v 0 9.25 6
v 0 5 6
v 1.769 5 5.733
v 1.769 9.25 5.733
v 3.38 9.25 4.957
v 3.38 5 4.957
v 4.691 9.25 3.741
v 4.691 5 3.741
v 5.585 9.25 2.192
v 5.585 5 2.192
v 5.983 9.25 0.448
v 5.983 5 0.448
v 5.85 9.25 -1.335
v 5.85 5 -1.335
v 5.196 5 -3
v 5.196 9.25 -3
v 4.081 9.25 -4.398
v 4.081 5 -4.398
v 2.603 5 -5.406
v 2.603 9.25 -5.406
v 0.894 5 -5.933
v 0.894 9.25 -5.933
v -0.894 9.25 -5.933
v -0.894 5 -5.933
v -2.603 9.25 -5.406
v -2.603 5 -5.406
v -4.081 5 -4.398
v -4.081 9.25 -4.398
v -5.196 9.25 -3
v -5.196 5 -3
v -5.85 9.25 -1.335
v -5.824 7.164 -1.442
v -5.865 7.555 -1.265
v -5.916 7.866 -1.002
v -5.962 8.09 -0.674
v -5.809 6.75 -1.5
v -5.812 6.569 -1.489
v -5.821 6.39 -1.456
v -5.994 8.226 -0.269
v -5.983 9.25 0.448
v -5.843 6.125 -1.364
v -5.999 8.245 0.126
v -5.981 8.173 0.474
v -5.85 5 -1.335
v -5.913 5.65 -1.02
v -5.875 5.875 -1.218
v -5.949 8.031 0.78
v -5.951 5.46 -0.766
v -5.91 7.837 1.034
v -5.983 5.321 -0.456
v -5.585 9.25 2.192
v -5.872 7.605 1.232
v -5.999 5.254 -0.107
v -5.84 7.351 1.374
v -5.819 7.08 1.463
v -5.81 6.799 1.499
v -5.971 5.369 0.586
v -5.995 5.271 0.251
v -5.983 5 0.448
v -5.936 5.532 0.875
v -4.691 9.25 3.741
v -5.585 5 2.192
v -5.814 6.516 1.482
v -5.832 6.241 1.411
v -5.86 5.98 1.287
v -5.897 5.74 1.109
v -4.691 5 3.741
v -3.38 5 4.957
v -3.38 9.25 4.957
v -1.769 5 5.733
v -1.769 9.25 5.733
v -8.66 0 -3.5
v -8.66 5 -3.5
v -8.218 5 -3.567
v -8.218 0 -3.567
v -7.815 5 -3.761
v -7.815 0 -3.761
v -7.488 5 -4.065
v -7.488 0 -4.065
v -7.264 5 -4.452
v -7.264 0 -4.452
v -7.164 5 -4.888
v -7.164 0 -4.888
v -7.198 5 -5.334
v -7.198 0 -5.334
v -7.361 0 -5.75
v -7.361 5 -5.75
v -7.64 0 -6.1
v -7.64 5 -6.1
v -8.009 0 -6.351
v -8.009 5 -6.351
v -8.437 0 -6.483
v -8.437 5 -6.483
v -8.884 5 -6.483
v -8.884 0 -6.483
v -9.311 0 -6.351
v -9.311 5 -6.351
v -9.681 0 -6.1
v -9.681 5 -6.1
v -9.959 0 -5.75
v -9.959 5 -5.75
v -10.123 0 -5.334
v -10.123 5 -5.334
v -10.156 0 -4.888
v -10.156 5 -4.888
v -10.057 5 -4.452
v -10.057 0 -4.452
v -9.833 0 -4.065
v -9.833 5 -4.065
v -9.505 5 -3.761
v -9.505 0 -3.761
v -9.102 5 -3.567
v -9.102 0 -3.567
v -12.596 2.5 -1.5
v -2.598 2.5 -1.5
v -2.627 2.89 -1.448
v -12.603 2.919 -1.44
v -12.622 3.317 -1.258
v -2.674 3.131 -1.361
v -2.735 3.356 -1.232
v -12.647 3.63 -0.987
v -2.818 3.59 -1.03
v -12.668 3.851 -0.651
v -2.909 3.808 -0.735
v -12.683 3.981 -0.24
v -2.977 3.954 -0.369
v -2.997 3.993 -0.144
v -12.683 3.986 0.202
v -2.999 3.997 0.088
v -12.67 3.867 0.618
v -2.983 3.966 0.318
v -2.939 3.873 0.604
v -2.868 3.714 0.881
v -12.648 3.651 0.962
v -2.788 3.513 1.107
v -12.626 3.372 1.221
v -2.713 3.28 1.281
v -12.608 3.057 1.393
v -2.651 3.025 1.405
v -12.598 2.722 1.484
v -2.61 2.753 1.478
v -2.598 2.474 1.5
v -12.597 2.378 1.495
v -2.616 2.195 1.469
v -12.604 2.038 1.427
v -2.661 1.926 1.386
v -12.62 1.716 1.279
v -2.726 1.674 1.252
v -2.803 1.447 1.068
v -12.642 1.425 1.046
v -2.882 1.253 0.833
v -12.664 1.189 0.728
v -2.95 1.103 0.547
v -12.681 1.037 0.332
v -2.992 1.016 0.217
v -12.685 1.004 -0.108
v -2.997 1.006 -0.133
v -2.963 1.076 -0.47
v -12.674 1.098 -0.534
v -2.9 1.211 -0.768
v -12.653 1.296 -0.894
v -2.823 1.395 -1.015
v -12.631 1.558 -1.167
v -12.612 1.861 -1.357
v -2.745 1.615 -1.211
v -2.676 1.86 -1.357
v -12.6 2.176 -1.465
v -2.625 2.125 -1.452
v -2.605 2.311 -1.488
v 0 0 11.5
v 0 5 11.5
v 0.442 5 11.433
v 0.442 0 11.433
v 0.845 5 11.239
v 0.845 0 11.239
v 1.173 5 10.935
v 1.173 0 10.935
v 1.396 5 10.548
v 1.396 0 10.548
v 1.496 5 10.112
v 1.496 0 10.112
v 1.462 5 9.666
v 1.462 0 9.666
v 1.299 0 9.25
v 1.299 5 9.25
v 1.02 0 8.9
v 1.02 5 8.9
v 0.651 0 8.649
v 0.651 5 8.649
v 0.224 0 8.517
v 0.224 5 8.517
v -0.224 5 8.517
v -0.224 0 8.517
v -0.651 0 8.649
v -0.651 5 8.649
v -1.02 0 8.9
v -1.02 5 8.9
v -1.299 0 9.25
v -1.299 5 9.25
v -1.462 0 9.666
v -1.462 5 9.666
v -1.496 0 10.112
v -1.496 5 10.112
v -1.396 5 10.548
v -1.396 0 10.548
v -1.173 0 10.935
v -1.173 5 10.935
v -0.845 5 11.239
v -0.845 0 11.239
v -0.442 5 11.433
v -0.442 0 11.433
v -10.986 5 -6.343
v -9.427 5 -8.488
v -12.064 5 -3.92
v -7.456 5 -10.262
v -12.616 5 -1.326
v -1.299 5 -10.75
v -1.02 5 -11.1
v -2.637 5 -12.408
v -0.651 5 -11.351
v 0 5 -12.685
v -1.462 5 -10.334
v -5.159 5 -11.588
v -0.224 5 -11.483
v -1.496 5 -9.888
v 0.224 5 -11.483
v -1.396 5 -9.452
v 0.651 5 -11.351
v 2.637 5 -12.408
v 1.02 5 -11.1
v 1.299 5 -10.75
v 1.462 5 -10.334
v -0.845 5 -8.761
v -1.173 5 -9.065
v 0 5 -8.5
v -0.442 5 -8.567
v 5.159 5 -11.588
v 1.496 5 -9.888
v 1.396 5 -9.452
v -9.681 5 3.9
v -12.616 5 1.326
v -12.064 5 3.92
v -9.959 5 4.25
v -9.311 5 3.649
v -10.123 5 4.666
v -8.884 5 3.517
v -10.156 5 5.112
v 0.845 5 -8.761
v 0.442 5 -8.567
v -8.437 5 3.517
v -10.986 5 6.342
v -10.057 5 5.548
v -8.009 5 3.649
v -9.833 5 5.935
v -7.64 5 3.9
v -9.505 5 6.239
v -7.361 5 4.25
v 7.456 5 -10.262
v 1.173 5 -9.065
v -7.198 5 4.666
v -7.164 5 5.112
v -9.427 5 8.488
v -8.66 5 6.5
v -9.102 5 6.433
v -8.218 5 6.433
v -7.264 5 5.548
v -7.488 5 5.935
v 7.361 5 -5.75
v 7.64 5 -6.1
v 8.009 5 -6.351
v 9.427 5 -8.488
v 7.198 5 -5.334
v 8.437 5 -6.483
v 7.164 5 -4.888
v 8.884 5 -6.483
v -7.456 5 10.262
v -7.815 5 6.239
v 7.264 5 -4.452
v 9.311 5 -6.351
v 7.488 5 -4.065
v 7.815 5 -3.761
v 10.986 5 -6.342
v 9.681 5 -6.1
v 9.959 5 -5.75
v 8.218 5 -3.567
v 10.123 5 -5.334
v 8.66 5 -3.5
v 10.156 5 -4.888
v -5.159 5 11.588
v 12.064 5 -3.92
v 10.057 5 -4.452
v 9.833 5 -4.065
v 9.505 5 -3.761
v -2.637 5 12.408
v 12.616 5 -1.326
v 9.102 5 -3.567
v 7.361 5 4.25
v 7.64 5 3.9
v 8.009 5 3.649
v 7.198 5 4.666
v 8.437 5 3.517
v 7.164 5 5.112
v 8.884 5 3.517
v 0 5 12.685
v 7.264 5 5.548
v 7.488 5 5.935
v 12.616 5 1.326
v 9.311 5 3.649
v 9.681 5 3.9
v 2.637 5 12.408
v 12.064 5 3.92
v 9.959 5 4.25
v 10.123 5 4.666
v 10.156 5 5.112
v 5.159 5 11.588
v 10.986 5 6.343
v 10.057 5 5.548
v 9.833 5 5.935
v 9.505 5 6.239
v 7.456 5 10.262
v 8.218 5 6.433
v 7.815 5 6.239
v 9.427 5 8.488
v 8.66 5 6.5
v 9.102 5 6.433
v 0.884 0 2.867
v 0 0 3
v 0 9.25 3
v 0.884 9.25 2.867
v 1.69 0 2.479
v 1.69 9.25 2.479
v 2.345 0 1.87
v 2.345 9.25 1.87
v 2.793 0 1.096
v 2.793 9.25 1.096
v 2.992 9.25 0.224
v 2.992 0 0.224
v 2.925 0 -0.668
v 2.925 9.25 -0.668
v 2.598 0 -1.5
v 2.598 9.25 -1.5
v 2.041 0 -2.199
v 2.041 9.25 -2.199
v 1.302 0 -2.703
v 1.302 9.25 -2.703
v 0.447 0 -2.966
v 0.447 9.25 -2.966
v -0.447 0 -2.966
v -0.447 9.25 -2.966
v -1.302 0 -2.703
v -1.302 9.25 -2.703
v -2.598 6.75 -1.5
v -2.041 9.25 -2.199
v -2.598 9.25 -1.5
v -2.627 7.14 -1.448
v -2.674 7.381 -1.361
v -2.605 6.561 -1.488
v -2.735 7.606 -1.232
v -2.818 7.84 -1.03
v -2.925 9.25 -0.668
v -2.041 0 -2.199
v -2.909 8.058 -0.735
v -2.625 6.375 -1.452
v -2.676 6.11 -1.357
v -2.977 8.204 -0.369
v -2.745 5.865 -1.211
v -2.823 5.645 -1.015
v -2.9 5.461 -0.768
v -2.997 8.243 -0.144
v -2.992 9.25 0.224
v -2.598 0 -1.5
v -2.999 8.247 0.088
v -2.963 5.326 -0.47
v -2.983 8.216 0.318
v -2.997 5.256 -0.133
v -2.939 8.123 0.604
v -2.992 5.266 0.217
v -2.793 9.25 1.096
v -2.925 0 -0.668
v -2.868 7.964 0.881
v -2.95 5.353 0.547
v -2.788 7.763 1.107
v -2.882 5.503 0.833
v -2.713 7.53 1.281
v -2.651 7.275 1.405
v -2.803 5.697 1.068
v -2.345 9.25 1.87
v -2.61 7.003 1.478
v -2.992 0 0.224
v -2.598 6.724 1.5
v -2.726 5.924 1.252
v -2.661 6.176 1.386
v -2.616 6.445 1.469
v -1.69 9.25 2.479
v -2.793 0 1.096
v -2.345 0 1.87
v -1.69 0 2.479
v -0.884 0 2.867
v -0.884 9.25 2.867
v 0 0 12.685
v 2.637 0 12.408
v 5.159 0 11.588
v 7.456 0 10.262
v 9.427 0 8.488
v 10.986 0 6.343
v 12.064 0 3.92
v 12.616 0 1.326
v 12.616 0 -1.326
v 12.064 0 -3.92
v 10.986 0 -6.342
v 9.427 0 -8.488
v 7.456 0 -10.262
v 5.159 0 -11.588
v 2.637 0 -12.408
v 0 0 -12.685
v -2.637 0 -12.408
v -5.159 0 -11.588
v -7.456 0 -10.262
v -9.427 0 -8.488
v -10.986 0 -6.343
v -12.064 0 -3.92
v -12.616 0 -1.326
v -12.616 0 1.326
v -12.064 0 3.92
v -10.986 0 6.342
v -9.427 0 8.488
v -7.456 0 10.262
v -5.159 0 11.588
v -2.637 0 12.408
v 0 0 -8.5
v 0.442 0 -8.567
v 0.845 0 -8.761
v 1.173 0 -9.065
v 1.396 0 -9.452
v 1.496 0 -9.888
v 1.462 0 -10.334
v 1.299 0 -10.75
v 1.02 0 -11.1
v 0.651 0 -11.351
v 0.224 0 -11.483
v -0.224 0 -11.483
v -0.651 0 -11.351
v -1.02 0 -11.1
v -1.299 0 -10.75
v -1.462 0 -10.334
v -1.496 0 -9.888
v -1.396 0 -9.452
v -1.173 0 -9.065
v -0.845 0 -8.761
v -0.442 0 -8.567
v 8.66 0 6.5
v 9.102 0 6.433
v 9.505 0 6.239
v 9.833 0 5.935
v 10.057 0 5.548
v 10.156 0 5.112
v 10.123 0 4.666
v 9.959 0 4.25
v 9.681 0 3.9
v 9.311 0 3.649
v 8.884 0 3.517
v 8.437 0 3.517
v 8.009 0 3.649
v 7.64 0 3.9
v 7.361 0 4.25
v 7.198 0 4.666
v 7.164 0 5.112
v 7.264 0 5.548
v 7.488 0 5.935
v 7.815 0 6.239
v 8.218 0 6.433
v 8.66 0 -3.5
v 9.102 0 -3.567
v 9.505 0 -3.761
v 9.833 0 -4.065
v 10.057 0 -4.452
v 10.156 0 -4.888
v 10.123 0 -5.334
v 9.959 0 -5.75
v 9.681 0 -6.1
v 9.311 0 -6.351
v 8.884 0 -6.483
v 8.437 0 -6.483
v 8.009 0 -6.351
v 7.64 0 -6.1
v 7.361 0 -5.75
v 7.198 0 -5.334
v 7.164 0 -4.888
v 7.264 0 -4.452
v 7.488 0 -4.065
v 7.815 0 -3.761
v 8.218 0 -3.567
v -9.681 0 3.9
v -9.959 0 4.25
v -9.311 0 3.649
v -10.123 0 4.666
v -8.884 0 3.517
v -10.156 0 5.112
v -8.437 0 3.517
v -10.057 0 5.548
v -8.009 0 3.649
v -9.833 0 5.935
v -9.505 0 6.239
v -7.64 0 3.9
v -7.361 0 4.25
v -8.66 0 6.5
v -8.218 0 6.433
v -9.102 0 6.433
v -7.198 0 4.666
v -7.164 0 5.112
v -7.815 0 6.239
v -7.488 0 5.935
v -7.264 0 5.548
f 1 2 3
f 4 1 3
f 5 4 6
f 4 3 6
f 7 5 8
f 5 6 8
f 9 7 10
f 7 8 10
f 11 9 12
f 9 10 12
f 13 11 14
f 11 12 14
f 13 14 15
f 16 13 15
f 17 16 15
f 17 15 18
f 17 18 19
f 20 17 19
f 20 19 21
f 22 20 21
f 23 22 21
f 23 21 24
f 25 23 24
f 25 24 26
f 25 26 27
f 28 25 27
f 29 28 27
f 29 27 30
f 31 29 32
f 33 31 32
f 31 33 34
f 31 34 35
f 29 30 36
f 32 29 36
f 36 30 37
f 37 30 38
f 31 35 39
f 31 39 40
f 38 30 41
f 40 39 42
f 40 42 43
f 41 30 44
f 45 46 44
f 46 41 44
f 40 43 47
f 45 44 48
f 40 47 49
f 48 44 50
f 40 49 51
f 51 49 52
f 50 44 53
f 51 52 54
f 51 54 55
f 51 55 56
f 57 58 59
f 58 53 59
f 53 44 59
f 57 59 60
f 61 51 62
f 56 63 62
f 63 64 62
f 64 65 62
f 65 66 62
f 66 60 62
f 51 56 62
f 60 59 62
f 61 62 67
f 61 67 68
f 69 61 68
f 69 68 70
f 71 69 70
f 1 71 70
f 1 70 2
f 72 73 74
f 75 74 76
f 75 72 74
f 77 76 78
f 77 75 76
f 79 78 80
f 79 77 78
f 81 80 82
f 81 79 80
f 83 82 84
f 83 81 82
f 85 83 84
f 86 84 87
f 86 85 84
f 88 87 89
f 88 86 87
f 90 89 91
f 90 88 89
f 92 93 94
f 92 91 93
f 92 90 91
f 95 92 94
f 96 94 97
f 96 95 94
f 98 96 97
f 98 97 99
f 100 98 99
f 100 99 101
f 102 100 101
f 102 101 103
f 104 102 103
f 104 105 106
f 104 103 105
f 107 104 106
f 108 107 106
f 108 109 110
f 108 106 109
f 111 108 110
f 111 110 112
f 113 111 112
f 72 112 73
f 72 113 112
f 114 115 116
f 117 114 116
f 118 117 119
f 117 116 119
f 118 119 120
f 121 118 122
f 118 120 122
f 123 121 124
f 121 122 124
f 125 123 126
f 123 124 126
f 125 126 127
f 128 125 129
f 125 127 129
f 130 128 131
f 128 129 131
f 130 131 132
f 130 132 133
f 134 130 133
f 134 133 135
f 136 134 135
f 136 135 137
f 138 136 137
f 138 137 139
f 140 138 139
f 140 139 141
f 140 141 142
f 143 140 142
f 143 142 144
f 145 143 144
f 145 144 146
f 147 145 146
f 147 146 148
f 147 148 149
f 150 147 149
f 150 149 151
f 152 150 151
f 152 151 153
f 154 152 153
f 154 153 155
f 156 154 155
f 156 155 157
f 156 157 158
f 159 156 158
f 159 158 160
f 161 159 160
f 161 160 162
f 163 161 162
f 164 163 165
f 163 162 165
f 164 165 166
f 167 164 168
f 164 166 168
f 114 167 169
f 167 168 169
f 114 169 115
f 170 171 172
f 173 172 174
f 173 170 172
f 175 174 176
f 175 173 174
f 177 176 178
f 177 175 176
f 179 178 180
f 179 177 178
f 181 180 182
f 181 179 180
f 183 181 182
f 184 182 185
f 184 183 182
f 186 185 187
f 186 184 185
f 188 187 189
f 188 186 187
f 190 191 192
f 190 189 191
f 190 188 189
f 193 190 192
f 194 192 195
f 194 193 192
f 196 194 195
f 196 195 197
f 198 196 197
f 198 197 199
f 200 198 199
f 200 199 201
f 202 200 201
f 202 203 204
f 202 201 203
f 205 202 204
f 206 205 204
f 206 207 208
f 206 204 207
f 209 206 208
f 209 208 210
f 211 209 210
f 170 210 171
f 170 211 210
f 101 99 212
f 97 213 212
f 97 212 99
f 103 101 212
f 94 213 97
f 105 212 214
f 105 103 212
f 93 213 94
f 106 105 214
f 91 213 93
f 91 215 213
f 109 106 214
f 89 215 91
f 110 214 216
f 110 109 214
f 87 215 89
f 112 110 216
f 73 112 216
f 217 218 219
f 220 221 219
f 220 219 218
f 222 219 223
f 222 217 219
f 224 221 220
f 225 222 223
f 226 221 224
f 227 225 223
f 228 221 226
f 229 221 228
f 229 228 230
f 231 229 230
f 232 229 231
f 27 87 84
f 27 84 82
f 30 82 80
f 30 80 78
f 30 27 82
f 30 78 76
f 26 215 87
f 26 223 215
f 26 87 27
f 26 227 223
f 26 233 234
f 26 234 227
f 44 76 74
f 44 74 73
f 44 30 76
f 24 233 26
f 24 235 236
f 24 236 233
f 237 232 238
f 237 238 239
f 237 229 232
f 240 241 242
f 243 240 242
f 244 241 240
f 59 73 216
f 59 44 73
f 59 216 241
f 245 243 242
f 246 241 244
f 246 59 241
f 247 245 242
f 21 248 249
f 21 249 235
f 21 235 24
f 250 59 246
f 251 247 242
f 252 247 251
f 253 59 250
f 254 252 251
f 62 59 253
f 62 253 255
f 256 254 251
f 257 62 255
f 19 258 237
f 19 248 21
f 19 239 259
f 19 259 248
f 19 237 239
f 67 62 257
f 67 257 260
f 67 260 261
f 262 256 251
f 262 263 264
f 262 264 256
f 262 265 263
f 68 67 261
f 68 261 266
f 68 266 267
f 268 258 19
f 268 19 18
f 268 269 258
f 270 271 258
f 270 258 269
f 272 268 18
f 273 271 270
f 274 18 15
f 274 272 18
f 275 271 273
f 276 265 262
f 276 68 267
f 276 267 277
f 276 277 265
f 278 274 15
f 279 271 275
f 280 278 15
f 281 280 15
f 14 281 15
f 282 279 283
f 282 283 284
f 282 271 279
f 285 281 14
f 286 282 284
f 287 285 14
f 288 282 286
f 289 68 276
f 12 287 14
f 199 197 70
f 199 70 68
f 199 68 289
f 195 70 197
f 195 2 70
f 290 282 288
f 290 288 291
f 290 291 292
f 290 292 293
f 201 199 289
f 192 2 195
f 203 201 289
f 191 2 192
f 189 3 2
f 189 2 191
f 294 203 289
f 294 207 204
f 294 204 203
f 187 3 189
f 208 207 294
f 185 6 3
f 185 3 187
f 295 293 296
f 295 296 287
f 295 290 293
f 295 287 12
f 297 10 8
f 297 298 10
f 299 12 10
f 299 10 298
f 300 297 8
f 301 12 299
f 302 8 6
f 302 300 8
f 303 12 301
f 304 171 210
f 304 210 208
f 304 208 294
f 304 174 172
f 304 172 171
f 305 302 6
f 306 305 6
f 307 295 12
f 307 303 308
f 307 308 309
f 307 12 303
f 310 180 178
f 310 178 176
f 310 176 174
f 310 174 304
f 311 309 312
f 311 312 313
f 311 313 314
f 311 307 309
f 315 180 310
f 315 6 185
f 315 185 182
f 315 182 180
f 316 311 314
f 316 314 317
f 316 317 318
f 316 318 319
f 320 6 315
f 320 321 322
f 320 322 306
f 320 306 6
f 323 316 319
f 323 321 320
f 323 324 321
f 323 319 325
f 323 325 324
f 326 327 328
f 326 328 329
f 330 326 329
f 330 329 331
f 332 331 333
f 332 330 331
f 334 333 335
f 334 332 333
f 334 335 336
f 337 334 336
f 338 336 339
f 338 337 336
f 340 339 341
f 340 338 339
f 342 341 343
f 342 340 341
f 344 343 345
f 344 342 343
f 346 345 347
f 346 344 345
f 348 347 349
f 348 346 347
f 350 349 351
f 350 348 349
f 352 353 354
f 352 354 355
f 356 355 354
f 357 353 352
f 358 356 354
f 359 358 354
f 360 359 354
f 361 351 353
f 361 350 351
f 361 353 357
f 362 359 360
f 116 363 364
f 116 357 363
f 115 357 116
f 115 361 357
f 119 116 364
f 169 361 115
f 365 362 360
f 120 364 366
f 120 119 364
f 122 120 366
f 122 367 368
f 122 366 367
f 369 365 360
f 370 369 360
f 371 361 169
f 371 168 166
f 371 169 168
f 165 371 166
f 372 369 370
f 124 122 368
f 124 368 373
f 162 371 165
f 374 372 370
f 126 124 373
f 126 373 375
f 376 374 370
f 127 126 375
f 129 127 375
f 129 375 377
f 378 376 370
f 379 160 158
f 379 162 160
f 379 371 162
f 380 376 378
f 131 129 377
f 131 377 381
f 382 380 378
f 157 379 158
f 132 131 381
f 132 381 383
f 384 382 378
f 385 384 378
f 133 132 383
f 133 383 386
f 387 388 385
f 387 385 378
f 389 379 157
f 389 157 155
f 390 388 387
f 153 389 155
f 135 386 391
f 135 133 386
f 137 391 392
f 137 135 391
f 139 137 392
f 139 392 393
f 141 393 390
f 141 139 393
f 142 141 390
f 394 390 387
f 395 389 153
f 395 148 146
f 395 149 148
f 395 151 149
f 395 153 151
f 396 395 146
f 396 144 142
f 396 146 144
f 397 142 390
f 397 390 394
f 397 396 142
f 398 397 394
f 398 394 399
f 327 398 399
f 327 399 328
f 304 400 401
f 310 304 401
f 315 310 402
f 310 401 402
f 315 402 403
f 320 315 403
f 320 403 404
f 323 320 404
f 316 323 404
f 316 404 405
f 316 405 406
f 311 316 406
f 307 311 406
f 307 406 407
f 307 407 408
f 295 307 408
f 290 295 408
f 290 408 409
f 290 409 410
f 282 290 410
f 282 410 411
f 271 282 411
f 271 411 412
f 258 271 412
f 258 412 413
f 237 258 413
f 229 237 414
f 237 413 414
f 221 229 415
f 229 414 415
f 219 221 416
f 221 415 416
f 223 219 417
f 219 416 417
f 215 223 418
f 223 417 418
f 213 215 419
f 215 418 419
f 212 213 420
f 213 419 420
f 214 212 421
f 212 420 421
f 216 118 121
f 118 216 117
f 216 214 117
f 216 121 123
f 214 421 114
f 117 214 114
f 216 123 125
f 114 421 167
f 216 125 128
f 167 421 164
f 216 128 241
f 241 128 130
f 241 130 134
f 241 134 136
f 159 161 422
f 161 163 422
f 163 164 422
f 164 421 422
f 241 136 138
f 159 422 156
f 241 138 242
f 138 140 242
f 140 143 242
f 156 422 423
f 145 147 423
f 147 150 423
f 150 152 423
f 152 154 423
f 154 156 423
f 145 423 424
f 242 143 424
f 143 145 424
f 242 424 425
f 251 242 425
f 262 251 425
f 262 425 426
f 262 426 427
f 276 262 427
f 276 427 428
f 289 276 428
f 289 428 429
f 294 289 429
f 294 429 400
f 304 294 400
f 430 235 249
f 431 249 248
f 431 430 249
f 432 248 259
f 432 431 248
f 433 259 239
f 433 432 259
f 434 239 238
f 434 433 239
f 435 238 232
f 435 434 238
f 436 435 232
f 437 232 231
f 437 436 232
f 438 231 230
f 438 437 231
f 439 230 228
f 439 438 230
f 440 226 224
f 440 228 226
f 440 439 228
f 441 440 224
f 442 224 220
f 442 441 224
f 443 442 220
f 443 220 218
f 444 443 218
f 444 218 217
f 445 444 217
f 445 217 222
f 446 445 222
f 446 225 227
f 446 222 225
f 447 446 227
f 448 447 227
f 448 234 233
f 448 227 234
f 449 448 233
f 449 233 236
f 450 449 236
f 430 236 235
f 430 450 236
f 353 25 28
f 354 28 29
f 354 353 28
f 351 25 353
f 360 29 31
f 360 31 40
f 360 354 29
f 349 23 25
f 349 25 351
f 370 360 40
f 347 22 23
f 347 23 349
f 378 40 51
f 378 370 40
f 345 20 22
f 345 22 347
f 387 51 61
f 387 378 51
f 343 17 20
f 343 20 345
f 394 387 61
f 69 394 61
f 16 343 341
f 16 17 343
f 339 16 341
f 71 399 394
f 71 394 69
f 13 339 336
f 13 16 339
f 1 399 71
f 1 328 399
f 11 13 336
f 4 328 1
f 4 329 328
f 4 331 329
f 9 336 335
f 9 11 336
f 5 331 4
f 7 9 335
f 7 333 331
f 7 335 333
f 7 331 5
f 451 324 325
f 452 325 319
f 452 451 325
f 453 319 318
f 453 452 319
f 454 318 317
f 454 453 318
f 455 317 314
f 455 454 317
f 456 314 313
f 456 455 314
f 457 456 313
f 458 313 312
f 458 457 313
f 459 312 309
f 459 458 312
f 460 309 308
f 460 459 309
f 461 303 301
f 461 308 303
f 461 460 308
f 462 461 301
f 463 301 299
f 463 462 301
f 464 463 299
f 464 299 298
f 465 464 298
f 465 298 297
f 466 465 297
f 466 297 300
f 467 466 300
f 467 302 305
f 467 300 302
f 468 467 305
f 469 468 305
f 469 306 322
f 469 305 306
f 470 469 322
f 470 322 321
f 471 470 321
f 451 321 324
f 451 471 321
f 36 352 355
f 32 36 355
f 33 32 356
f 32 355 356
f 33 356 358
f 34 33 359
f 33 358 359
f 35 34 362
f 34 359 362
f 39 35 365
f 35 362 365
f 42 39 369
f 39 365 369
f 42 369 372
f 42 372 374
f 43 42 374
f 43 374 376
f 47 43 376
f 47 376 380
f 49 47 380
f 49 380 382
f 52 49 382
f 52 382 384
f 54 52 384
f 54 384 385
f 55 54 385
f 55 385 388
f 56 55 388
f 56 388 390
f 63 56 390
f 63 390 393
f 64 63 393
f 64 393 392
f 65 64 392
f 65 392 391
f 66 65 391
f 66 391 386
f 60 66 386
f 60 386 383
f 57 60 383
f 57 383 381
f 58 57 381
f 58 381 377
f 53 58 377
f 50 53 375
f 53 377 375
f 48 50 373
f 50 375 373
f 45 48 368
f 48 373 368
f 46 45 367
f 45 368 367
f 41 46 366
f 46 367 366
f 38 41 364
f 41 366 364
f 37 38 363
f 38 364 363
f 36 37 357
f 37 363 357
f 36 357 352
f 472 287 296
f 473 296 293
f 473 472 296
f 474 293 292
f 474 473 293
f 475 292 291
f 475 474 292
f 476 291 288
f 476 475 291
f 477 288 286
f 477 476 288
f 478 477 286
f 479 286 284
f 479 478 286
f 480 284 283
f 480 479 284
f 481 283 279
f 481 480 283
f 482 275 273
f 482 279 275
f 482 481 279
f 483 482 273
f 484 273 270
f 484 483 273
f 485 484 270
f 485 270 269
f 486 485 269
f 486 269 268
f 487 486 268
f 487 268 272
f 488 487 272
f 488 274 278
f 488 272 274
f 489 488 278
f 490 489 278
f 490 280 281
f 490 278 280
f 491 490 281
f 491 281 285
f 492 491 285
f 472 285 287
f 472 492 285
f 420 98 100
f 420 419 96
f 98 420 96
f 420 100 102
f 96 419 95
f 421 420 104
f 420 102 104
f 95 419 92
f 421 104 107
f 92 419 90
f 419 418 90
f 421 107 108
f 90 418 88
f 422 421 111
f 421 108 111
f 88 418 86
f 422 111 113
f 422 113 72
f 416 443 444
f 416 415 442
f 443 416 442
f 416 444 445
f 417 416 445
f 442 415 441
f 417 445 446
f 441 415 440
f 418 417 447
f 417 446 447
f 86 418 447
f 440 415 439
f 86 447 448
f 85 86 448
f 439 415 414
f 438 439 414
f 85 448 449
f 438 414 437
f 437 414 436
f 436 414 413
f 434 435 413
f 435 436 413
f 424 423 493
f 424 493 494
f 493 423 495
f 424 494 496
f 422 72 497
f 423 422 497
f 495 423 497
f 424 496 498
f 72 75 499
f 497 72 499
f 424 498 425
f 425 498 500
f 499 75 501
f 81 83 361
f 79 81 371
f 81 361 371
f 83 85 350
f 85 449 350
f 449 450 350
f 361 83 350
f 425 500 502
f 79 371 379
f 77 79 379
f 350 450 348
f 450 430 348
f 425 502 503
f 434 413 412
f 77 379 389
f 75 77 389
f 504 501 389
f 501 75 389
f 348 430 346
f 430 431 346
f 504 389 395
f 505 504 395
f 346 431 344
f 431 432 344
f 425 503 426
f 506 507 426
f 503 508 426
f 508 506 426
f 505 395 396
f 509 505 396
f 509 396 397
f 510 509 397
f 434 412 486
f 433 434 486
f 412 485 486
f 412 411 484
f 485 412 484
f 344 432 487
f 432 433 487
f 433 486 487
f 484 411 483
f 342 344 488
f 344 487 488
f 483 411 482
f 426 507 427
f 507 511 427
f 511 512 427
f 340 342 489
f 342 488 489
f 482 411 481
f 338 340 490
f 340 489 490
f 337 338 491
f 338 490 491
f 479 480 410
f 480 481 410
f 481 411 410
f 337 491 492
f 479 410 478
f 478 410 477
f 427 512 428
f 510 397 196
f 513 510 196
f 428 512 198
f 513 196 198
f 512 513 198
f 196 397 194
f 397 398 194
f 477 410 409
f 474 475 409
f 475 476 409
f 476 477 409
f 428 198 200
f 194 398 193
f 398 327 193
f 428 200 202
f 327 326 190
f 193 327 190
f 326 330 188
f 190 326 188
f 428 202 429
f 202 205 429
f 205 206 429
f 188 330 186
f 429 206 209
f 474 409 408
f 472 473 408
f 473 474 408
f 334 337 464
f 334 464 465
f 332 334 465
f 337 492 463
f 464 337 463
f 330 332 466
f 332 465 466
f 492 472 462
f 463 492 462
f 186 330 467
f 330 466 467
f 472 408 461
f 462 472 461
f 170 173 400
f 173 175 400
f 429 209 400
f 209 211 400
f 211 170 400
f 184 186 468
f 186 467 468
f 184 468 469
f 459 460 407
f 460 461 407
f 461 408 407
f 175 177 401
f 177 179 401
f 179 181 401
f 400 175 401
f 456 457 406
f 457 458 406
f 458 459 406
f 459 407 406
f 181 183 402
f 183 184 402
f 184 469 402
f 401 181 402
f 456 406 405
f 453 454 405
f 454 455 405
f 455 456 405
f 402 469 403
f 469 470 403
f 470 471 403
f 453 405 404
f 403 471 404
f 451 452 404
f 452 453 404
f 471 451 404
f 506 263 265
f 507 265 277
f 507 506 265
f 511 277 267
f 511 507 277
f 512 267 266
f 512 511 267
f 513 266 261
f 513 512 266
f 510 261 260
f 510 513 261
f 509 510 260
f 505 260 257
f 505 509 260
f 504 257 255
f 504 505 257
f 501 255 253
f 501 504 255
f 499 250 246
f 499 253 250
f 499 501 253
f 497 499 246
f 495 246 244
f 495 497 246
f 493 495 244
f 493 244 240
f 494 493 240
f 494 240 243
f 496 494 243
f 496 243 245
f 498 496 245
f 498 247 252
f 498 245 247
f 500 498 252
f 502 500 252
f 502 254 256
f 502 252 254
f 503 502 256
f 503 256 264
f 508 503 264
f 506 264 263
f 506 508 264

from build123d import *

# Parameters (mm, degrees)
SKETCH1_R           = 12.685
SKETCH1_R_2         = 3
BOSS_EXTRUDE1_DEPTH = 5
SKETCH2_R           = 6
SKETCH2_R_2         = 3
BOSS_EXTRUDE2_DEPTH = 9.25
SKETCH3_R           = 1.5
CUT_EXTRUDE1_DEPTH  = 12
SKETCH5_R           = 1.5
CUT_EXTRUDE3_DEPTH  = 21.183680289


with BuildPart() as part:
    # Sketch1 → Boss-Extrude1 (new body)
    with BuildSketch(Plane(origin=(0, 0, 0), x_dir=(1, 0, 0), z_dir=(0, 1, 0))):
        with Locations(Location((0, 0, 0), (0, 0, 270))):
            Circle(SKETCH1_R)
        with Locations(Location((0, 0, 0), (0, 0, 270))):
            Circle(SKETCH1_R_2, mode=Mode.SUBTRACT)
    extrude(amount=BOSS_EXTRUDE1_DEPTH)

    # Sketch2 → Boss-Extrude2 (add)
    with BuildSketch(Plane(origin=(0, 0, 0), x_dir=(1, 0, 0), z_dir=(0, 1, 0))):
        with Locations(Location((0, 0, 0), (0, 0, 270))):
            Circle(SKETCH2_R)
        with Locations(Location((0, 0, 0), (0, 0, 270))):
            Circle(SKETCH2_R_2, mode=Mode.SUBTRACT)
    extrude(amount=BOSS_EXTRUDE2_DEPTH)

    # Sketch3 → Cut-Extrude1 (cut)
    with BuildSketch(Plane(origin=(0, 0, 0), x_dir=(1, 0, 0), z_dir=(0, 1, 0))):
        with Locations(Location((0, 10, 0), (0, 0, 270))):
            Circle(SKETCH3_R)
        with Locations(Location((8.660254038, 5, 0), (0, 0, 270))):
            Circle(SKETCH3_R)
        with Locations(Location((8.660254038, -5, 0), (0, 0, 270))):
            Circle(SKETCH3_R)
        with Locations(Location((0, -10, 0), (0, 0, 270))):
            Circle(SKETCH3_R)
        with Locations(Location((-8.660254038, -5, 0), (0, 0, 270))):
            Circle(SKETCH3_R)
        with Locations(Location((-8.660254038, 5, 0), (0, 0, 270))):
            Circle(SKETCH3_R)
    extrude(amount=CUT_EXTRUDE1_DEPTH, mode=Mode.SUBTRACT)

    # Sketch5 → Cut-Extrude3 (cut, through all)
    with BuildSketch(Plane(origin=(0, 0, 0), x_dir=(0, -1, 0), z_dir=(1, 0, 0))):
        with Locations(Location((-6.75, 0, 0), (0, 0, 90))):
            Circle(SKETCH5_R)
        with Locations(Location((-2.5, 0, 0), (0, 0, 90))):
            Circle(SKETCH5_R)
    extrude(amount=-CUT_EXTRUDE3_DEPTH, mode=Mode.SUBTRACT)


solid = part.part
